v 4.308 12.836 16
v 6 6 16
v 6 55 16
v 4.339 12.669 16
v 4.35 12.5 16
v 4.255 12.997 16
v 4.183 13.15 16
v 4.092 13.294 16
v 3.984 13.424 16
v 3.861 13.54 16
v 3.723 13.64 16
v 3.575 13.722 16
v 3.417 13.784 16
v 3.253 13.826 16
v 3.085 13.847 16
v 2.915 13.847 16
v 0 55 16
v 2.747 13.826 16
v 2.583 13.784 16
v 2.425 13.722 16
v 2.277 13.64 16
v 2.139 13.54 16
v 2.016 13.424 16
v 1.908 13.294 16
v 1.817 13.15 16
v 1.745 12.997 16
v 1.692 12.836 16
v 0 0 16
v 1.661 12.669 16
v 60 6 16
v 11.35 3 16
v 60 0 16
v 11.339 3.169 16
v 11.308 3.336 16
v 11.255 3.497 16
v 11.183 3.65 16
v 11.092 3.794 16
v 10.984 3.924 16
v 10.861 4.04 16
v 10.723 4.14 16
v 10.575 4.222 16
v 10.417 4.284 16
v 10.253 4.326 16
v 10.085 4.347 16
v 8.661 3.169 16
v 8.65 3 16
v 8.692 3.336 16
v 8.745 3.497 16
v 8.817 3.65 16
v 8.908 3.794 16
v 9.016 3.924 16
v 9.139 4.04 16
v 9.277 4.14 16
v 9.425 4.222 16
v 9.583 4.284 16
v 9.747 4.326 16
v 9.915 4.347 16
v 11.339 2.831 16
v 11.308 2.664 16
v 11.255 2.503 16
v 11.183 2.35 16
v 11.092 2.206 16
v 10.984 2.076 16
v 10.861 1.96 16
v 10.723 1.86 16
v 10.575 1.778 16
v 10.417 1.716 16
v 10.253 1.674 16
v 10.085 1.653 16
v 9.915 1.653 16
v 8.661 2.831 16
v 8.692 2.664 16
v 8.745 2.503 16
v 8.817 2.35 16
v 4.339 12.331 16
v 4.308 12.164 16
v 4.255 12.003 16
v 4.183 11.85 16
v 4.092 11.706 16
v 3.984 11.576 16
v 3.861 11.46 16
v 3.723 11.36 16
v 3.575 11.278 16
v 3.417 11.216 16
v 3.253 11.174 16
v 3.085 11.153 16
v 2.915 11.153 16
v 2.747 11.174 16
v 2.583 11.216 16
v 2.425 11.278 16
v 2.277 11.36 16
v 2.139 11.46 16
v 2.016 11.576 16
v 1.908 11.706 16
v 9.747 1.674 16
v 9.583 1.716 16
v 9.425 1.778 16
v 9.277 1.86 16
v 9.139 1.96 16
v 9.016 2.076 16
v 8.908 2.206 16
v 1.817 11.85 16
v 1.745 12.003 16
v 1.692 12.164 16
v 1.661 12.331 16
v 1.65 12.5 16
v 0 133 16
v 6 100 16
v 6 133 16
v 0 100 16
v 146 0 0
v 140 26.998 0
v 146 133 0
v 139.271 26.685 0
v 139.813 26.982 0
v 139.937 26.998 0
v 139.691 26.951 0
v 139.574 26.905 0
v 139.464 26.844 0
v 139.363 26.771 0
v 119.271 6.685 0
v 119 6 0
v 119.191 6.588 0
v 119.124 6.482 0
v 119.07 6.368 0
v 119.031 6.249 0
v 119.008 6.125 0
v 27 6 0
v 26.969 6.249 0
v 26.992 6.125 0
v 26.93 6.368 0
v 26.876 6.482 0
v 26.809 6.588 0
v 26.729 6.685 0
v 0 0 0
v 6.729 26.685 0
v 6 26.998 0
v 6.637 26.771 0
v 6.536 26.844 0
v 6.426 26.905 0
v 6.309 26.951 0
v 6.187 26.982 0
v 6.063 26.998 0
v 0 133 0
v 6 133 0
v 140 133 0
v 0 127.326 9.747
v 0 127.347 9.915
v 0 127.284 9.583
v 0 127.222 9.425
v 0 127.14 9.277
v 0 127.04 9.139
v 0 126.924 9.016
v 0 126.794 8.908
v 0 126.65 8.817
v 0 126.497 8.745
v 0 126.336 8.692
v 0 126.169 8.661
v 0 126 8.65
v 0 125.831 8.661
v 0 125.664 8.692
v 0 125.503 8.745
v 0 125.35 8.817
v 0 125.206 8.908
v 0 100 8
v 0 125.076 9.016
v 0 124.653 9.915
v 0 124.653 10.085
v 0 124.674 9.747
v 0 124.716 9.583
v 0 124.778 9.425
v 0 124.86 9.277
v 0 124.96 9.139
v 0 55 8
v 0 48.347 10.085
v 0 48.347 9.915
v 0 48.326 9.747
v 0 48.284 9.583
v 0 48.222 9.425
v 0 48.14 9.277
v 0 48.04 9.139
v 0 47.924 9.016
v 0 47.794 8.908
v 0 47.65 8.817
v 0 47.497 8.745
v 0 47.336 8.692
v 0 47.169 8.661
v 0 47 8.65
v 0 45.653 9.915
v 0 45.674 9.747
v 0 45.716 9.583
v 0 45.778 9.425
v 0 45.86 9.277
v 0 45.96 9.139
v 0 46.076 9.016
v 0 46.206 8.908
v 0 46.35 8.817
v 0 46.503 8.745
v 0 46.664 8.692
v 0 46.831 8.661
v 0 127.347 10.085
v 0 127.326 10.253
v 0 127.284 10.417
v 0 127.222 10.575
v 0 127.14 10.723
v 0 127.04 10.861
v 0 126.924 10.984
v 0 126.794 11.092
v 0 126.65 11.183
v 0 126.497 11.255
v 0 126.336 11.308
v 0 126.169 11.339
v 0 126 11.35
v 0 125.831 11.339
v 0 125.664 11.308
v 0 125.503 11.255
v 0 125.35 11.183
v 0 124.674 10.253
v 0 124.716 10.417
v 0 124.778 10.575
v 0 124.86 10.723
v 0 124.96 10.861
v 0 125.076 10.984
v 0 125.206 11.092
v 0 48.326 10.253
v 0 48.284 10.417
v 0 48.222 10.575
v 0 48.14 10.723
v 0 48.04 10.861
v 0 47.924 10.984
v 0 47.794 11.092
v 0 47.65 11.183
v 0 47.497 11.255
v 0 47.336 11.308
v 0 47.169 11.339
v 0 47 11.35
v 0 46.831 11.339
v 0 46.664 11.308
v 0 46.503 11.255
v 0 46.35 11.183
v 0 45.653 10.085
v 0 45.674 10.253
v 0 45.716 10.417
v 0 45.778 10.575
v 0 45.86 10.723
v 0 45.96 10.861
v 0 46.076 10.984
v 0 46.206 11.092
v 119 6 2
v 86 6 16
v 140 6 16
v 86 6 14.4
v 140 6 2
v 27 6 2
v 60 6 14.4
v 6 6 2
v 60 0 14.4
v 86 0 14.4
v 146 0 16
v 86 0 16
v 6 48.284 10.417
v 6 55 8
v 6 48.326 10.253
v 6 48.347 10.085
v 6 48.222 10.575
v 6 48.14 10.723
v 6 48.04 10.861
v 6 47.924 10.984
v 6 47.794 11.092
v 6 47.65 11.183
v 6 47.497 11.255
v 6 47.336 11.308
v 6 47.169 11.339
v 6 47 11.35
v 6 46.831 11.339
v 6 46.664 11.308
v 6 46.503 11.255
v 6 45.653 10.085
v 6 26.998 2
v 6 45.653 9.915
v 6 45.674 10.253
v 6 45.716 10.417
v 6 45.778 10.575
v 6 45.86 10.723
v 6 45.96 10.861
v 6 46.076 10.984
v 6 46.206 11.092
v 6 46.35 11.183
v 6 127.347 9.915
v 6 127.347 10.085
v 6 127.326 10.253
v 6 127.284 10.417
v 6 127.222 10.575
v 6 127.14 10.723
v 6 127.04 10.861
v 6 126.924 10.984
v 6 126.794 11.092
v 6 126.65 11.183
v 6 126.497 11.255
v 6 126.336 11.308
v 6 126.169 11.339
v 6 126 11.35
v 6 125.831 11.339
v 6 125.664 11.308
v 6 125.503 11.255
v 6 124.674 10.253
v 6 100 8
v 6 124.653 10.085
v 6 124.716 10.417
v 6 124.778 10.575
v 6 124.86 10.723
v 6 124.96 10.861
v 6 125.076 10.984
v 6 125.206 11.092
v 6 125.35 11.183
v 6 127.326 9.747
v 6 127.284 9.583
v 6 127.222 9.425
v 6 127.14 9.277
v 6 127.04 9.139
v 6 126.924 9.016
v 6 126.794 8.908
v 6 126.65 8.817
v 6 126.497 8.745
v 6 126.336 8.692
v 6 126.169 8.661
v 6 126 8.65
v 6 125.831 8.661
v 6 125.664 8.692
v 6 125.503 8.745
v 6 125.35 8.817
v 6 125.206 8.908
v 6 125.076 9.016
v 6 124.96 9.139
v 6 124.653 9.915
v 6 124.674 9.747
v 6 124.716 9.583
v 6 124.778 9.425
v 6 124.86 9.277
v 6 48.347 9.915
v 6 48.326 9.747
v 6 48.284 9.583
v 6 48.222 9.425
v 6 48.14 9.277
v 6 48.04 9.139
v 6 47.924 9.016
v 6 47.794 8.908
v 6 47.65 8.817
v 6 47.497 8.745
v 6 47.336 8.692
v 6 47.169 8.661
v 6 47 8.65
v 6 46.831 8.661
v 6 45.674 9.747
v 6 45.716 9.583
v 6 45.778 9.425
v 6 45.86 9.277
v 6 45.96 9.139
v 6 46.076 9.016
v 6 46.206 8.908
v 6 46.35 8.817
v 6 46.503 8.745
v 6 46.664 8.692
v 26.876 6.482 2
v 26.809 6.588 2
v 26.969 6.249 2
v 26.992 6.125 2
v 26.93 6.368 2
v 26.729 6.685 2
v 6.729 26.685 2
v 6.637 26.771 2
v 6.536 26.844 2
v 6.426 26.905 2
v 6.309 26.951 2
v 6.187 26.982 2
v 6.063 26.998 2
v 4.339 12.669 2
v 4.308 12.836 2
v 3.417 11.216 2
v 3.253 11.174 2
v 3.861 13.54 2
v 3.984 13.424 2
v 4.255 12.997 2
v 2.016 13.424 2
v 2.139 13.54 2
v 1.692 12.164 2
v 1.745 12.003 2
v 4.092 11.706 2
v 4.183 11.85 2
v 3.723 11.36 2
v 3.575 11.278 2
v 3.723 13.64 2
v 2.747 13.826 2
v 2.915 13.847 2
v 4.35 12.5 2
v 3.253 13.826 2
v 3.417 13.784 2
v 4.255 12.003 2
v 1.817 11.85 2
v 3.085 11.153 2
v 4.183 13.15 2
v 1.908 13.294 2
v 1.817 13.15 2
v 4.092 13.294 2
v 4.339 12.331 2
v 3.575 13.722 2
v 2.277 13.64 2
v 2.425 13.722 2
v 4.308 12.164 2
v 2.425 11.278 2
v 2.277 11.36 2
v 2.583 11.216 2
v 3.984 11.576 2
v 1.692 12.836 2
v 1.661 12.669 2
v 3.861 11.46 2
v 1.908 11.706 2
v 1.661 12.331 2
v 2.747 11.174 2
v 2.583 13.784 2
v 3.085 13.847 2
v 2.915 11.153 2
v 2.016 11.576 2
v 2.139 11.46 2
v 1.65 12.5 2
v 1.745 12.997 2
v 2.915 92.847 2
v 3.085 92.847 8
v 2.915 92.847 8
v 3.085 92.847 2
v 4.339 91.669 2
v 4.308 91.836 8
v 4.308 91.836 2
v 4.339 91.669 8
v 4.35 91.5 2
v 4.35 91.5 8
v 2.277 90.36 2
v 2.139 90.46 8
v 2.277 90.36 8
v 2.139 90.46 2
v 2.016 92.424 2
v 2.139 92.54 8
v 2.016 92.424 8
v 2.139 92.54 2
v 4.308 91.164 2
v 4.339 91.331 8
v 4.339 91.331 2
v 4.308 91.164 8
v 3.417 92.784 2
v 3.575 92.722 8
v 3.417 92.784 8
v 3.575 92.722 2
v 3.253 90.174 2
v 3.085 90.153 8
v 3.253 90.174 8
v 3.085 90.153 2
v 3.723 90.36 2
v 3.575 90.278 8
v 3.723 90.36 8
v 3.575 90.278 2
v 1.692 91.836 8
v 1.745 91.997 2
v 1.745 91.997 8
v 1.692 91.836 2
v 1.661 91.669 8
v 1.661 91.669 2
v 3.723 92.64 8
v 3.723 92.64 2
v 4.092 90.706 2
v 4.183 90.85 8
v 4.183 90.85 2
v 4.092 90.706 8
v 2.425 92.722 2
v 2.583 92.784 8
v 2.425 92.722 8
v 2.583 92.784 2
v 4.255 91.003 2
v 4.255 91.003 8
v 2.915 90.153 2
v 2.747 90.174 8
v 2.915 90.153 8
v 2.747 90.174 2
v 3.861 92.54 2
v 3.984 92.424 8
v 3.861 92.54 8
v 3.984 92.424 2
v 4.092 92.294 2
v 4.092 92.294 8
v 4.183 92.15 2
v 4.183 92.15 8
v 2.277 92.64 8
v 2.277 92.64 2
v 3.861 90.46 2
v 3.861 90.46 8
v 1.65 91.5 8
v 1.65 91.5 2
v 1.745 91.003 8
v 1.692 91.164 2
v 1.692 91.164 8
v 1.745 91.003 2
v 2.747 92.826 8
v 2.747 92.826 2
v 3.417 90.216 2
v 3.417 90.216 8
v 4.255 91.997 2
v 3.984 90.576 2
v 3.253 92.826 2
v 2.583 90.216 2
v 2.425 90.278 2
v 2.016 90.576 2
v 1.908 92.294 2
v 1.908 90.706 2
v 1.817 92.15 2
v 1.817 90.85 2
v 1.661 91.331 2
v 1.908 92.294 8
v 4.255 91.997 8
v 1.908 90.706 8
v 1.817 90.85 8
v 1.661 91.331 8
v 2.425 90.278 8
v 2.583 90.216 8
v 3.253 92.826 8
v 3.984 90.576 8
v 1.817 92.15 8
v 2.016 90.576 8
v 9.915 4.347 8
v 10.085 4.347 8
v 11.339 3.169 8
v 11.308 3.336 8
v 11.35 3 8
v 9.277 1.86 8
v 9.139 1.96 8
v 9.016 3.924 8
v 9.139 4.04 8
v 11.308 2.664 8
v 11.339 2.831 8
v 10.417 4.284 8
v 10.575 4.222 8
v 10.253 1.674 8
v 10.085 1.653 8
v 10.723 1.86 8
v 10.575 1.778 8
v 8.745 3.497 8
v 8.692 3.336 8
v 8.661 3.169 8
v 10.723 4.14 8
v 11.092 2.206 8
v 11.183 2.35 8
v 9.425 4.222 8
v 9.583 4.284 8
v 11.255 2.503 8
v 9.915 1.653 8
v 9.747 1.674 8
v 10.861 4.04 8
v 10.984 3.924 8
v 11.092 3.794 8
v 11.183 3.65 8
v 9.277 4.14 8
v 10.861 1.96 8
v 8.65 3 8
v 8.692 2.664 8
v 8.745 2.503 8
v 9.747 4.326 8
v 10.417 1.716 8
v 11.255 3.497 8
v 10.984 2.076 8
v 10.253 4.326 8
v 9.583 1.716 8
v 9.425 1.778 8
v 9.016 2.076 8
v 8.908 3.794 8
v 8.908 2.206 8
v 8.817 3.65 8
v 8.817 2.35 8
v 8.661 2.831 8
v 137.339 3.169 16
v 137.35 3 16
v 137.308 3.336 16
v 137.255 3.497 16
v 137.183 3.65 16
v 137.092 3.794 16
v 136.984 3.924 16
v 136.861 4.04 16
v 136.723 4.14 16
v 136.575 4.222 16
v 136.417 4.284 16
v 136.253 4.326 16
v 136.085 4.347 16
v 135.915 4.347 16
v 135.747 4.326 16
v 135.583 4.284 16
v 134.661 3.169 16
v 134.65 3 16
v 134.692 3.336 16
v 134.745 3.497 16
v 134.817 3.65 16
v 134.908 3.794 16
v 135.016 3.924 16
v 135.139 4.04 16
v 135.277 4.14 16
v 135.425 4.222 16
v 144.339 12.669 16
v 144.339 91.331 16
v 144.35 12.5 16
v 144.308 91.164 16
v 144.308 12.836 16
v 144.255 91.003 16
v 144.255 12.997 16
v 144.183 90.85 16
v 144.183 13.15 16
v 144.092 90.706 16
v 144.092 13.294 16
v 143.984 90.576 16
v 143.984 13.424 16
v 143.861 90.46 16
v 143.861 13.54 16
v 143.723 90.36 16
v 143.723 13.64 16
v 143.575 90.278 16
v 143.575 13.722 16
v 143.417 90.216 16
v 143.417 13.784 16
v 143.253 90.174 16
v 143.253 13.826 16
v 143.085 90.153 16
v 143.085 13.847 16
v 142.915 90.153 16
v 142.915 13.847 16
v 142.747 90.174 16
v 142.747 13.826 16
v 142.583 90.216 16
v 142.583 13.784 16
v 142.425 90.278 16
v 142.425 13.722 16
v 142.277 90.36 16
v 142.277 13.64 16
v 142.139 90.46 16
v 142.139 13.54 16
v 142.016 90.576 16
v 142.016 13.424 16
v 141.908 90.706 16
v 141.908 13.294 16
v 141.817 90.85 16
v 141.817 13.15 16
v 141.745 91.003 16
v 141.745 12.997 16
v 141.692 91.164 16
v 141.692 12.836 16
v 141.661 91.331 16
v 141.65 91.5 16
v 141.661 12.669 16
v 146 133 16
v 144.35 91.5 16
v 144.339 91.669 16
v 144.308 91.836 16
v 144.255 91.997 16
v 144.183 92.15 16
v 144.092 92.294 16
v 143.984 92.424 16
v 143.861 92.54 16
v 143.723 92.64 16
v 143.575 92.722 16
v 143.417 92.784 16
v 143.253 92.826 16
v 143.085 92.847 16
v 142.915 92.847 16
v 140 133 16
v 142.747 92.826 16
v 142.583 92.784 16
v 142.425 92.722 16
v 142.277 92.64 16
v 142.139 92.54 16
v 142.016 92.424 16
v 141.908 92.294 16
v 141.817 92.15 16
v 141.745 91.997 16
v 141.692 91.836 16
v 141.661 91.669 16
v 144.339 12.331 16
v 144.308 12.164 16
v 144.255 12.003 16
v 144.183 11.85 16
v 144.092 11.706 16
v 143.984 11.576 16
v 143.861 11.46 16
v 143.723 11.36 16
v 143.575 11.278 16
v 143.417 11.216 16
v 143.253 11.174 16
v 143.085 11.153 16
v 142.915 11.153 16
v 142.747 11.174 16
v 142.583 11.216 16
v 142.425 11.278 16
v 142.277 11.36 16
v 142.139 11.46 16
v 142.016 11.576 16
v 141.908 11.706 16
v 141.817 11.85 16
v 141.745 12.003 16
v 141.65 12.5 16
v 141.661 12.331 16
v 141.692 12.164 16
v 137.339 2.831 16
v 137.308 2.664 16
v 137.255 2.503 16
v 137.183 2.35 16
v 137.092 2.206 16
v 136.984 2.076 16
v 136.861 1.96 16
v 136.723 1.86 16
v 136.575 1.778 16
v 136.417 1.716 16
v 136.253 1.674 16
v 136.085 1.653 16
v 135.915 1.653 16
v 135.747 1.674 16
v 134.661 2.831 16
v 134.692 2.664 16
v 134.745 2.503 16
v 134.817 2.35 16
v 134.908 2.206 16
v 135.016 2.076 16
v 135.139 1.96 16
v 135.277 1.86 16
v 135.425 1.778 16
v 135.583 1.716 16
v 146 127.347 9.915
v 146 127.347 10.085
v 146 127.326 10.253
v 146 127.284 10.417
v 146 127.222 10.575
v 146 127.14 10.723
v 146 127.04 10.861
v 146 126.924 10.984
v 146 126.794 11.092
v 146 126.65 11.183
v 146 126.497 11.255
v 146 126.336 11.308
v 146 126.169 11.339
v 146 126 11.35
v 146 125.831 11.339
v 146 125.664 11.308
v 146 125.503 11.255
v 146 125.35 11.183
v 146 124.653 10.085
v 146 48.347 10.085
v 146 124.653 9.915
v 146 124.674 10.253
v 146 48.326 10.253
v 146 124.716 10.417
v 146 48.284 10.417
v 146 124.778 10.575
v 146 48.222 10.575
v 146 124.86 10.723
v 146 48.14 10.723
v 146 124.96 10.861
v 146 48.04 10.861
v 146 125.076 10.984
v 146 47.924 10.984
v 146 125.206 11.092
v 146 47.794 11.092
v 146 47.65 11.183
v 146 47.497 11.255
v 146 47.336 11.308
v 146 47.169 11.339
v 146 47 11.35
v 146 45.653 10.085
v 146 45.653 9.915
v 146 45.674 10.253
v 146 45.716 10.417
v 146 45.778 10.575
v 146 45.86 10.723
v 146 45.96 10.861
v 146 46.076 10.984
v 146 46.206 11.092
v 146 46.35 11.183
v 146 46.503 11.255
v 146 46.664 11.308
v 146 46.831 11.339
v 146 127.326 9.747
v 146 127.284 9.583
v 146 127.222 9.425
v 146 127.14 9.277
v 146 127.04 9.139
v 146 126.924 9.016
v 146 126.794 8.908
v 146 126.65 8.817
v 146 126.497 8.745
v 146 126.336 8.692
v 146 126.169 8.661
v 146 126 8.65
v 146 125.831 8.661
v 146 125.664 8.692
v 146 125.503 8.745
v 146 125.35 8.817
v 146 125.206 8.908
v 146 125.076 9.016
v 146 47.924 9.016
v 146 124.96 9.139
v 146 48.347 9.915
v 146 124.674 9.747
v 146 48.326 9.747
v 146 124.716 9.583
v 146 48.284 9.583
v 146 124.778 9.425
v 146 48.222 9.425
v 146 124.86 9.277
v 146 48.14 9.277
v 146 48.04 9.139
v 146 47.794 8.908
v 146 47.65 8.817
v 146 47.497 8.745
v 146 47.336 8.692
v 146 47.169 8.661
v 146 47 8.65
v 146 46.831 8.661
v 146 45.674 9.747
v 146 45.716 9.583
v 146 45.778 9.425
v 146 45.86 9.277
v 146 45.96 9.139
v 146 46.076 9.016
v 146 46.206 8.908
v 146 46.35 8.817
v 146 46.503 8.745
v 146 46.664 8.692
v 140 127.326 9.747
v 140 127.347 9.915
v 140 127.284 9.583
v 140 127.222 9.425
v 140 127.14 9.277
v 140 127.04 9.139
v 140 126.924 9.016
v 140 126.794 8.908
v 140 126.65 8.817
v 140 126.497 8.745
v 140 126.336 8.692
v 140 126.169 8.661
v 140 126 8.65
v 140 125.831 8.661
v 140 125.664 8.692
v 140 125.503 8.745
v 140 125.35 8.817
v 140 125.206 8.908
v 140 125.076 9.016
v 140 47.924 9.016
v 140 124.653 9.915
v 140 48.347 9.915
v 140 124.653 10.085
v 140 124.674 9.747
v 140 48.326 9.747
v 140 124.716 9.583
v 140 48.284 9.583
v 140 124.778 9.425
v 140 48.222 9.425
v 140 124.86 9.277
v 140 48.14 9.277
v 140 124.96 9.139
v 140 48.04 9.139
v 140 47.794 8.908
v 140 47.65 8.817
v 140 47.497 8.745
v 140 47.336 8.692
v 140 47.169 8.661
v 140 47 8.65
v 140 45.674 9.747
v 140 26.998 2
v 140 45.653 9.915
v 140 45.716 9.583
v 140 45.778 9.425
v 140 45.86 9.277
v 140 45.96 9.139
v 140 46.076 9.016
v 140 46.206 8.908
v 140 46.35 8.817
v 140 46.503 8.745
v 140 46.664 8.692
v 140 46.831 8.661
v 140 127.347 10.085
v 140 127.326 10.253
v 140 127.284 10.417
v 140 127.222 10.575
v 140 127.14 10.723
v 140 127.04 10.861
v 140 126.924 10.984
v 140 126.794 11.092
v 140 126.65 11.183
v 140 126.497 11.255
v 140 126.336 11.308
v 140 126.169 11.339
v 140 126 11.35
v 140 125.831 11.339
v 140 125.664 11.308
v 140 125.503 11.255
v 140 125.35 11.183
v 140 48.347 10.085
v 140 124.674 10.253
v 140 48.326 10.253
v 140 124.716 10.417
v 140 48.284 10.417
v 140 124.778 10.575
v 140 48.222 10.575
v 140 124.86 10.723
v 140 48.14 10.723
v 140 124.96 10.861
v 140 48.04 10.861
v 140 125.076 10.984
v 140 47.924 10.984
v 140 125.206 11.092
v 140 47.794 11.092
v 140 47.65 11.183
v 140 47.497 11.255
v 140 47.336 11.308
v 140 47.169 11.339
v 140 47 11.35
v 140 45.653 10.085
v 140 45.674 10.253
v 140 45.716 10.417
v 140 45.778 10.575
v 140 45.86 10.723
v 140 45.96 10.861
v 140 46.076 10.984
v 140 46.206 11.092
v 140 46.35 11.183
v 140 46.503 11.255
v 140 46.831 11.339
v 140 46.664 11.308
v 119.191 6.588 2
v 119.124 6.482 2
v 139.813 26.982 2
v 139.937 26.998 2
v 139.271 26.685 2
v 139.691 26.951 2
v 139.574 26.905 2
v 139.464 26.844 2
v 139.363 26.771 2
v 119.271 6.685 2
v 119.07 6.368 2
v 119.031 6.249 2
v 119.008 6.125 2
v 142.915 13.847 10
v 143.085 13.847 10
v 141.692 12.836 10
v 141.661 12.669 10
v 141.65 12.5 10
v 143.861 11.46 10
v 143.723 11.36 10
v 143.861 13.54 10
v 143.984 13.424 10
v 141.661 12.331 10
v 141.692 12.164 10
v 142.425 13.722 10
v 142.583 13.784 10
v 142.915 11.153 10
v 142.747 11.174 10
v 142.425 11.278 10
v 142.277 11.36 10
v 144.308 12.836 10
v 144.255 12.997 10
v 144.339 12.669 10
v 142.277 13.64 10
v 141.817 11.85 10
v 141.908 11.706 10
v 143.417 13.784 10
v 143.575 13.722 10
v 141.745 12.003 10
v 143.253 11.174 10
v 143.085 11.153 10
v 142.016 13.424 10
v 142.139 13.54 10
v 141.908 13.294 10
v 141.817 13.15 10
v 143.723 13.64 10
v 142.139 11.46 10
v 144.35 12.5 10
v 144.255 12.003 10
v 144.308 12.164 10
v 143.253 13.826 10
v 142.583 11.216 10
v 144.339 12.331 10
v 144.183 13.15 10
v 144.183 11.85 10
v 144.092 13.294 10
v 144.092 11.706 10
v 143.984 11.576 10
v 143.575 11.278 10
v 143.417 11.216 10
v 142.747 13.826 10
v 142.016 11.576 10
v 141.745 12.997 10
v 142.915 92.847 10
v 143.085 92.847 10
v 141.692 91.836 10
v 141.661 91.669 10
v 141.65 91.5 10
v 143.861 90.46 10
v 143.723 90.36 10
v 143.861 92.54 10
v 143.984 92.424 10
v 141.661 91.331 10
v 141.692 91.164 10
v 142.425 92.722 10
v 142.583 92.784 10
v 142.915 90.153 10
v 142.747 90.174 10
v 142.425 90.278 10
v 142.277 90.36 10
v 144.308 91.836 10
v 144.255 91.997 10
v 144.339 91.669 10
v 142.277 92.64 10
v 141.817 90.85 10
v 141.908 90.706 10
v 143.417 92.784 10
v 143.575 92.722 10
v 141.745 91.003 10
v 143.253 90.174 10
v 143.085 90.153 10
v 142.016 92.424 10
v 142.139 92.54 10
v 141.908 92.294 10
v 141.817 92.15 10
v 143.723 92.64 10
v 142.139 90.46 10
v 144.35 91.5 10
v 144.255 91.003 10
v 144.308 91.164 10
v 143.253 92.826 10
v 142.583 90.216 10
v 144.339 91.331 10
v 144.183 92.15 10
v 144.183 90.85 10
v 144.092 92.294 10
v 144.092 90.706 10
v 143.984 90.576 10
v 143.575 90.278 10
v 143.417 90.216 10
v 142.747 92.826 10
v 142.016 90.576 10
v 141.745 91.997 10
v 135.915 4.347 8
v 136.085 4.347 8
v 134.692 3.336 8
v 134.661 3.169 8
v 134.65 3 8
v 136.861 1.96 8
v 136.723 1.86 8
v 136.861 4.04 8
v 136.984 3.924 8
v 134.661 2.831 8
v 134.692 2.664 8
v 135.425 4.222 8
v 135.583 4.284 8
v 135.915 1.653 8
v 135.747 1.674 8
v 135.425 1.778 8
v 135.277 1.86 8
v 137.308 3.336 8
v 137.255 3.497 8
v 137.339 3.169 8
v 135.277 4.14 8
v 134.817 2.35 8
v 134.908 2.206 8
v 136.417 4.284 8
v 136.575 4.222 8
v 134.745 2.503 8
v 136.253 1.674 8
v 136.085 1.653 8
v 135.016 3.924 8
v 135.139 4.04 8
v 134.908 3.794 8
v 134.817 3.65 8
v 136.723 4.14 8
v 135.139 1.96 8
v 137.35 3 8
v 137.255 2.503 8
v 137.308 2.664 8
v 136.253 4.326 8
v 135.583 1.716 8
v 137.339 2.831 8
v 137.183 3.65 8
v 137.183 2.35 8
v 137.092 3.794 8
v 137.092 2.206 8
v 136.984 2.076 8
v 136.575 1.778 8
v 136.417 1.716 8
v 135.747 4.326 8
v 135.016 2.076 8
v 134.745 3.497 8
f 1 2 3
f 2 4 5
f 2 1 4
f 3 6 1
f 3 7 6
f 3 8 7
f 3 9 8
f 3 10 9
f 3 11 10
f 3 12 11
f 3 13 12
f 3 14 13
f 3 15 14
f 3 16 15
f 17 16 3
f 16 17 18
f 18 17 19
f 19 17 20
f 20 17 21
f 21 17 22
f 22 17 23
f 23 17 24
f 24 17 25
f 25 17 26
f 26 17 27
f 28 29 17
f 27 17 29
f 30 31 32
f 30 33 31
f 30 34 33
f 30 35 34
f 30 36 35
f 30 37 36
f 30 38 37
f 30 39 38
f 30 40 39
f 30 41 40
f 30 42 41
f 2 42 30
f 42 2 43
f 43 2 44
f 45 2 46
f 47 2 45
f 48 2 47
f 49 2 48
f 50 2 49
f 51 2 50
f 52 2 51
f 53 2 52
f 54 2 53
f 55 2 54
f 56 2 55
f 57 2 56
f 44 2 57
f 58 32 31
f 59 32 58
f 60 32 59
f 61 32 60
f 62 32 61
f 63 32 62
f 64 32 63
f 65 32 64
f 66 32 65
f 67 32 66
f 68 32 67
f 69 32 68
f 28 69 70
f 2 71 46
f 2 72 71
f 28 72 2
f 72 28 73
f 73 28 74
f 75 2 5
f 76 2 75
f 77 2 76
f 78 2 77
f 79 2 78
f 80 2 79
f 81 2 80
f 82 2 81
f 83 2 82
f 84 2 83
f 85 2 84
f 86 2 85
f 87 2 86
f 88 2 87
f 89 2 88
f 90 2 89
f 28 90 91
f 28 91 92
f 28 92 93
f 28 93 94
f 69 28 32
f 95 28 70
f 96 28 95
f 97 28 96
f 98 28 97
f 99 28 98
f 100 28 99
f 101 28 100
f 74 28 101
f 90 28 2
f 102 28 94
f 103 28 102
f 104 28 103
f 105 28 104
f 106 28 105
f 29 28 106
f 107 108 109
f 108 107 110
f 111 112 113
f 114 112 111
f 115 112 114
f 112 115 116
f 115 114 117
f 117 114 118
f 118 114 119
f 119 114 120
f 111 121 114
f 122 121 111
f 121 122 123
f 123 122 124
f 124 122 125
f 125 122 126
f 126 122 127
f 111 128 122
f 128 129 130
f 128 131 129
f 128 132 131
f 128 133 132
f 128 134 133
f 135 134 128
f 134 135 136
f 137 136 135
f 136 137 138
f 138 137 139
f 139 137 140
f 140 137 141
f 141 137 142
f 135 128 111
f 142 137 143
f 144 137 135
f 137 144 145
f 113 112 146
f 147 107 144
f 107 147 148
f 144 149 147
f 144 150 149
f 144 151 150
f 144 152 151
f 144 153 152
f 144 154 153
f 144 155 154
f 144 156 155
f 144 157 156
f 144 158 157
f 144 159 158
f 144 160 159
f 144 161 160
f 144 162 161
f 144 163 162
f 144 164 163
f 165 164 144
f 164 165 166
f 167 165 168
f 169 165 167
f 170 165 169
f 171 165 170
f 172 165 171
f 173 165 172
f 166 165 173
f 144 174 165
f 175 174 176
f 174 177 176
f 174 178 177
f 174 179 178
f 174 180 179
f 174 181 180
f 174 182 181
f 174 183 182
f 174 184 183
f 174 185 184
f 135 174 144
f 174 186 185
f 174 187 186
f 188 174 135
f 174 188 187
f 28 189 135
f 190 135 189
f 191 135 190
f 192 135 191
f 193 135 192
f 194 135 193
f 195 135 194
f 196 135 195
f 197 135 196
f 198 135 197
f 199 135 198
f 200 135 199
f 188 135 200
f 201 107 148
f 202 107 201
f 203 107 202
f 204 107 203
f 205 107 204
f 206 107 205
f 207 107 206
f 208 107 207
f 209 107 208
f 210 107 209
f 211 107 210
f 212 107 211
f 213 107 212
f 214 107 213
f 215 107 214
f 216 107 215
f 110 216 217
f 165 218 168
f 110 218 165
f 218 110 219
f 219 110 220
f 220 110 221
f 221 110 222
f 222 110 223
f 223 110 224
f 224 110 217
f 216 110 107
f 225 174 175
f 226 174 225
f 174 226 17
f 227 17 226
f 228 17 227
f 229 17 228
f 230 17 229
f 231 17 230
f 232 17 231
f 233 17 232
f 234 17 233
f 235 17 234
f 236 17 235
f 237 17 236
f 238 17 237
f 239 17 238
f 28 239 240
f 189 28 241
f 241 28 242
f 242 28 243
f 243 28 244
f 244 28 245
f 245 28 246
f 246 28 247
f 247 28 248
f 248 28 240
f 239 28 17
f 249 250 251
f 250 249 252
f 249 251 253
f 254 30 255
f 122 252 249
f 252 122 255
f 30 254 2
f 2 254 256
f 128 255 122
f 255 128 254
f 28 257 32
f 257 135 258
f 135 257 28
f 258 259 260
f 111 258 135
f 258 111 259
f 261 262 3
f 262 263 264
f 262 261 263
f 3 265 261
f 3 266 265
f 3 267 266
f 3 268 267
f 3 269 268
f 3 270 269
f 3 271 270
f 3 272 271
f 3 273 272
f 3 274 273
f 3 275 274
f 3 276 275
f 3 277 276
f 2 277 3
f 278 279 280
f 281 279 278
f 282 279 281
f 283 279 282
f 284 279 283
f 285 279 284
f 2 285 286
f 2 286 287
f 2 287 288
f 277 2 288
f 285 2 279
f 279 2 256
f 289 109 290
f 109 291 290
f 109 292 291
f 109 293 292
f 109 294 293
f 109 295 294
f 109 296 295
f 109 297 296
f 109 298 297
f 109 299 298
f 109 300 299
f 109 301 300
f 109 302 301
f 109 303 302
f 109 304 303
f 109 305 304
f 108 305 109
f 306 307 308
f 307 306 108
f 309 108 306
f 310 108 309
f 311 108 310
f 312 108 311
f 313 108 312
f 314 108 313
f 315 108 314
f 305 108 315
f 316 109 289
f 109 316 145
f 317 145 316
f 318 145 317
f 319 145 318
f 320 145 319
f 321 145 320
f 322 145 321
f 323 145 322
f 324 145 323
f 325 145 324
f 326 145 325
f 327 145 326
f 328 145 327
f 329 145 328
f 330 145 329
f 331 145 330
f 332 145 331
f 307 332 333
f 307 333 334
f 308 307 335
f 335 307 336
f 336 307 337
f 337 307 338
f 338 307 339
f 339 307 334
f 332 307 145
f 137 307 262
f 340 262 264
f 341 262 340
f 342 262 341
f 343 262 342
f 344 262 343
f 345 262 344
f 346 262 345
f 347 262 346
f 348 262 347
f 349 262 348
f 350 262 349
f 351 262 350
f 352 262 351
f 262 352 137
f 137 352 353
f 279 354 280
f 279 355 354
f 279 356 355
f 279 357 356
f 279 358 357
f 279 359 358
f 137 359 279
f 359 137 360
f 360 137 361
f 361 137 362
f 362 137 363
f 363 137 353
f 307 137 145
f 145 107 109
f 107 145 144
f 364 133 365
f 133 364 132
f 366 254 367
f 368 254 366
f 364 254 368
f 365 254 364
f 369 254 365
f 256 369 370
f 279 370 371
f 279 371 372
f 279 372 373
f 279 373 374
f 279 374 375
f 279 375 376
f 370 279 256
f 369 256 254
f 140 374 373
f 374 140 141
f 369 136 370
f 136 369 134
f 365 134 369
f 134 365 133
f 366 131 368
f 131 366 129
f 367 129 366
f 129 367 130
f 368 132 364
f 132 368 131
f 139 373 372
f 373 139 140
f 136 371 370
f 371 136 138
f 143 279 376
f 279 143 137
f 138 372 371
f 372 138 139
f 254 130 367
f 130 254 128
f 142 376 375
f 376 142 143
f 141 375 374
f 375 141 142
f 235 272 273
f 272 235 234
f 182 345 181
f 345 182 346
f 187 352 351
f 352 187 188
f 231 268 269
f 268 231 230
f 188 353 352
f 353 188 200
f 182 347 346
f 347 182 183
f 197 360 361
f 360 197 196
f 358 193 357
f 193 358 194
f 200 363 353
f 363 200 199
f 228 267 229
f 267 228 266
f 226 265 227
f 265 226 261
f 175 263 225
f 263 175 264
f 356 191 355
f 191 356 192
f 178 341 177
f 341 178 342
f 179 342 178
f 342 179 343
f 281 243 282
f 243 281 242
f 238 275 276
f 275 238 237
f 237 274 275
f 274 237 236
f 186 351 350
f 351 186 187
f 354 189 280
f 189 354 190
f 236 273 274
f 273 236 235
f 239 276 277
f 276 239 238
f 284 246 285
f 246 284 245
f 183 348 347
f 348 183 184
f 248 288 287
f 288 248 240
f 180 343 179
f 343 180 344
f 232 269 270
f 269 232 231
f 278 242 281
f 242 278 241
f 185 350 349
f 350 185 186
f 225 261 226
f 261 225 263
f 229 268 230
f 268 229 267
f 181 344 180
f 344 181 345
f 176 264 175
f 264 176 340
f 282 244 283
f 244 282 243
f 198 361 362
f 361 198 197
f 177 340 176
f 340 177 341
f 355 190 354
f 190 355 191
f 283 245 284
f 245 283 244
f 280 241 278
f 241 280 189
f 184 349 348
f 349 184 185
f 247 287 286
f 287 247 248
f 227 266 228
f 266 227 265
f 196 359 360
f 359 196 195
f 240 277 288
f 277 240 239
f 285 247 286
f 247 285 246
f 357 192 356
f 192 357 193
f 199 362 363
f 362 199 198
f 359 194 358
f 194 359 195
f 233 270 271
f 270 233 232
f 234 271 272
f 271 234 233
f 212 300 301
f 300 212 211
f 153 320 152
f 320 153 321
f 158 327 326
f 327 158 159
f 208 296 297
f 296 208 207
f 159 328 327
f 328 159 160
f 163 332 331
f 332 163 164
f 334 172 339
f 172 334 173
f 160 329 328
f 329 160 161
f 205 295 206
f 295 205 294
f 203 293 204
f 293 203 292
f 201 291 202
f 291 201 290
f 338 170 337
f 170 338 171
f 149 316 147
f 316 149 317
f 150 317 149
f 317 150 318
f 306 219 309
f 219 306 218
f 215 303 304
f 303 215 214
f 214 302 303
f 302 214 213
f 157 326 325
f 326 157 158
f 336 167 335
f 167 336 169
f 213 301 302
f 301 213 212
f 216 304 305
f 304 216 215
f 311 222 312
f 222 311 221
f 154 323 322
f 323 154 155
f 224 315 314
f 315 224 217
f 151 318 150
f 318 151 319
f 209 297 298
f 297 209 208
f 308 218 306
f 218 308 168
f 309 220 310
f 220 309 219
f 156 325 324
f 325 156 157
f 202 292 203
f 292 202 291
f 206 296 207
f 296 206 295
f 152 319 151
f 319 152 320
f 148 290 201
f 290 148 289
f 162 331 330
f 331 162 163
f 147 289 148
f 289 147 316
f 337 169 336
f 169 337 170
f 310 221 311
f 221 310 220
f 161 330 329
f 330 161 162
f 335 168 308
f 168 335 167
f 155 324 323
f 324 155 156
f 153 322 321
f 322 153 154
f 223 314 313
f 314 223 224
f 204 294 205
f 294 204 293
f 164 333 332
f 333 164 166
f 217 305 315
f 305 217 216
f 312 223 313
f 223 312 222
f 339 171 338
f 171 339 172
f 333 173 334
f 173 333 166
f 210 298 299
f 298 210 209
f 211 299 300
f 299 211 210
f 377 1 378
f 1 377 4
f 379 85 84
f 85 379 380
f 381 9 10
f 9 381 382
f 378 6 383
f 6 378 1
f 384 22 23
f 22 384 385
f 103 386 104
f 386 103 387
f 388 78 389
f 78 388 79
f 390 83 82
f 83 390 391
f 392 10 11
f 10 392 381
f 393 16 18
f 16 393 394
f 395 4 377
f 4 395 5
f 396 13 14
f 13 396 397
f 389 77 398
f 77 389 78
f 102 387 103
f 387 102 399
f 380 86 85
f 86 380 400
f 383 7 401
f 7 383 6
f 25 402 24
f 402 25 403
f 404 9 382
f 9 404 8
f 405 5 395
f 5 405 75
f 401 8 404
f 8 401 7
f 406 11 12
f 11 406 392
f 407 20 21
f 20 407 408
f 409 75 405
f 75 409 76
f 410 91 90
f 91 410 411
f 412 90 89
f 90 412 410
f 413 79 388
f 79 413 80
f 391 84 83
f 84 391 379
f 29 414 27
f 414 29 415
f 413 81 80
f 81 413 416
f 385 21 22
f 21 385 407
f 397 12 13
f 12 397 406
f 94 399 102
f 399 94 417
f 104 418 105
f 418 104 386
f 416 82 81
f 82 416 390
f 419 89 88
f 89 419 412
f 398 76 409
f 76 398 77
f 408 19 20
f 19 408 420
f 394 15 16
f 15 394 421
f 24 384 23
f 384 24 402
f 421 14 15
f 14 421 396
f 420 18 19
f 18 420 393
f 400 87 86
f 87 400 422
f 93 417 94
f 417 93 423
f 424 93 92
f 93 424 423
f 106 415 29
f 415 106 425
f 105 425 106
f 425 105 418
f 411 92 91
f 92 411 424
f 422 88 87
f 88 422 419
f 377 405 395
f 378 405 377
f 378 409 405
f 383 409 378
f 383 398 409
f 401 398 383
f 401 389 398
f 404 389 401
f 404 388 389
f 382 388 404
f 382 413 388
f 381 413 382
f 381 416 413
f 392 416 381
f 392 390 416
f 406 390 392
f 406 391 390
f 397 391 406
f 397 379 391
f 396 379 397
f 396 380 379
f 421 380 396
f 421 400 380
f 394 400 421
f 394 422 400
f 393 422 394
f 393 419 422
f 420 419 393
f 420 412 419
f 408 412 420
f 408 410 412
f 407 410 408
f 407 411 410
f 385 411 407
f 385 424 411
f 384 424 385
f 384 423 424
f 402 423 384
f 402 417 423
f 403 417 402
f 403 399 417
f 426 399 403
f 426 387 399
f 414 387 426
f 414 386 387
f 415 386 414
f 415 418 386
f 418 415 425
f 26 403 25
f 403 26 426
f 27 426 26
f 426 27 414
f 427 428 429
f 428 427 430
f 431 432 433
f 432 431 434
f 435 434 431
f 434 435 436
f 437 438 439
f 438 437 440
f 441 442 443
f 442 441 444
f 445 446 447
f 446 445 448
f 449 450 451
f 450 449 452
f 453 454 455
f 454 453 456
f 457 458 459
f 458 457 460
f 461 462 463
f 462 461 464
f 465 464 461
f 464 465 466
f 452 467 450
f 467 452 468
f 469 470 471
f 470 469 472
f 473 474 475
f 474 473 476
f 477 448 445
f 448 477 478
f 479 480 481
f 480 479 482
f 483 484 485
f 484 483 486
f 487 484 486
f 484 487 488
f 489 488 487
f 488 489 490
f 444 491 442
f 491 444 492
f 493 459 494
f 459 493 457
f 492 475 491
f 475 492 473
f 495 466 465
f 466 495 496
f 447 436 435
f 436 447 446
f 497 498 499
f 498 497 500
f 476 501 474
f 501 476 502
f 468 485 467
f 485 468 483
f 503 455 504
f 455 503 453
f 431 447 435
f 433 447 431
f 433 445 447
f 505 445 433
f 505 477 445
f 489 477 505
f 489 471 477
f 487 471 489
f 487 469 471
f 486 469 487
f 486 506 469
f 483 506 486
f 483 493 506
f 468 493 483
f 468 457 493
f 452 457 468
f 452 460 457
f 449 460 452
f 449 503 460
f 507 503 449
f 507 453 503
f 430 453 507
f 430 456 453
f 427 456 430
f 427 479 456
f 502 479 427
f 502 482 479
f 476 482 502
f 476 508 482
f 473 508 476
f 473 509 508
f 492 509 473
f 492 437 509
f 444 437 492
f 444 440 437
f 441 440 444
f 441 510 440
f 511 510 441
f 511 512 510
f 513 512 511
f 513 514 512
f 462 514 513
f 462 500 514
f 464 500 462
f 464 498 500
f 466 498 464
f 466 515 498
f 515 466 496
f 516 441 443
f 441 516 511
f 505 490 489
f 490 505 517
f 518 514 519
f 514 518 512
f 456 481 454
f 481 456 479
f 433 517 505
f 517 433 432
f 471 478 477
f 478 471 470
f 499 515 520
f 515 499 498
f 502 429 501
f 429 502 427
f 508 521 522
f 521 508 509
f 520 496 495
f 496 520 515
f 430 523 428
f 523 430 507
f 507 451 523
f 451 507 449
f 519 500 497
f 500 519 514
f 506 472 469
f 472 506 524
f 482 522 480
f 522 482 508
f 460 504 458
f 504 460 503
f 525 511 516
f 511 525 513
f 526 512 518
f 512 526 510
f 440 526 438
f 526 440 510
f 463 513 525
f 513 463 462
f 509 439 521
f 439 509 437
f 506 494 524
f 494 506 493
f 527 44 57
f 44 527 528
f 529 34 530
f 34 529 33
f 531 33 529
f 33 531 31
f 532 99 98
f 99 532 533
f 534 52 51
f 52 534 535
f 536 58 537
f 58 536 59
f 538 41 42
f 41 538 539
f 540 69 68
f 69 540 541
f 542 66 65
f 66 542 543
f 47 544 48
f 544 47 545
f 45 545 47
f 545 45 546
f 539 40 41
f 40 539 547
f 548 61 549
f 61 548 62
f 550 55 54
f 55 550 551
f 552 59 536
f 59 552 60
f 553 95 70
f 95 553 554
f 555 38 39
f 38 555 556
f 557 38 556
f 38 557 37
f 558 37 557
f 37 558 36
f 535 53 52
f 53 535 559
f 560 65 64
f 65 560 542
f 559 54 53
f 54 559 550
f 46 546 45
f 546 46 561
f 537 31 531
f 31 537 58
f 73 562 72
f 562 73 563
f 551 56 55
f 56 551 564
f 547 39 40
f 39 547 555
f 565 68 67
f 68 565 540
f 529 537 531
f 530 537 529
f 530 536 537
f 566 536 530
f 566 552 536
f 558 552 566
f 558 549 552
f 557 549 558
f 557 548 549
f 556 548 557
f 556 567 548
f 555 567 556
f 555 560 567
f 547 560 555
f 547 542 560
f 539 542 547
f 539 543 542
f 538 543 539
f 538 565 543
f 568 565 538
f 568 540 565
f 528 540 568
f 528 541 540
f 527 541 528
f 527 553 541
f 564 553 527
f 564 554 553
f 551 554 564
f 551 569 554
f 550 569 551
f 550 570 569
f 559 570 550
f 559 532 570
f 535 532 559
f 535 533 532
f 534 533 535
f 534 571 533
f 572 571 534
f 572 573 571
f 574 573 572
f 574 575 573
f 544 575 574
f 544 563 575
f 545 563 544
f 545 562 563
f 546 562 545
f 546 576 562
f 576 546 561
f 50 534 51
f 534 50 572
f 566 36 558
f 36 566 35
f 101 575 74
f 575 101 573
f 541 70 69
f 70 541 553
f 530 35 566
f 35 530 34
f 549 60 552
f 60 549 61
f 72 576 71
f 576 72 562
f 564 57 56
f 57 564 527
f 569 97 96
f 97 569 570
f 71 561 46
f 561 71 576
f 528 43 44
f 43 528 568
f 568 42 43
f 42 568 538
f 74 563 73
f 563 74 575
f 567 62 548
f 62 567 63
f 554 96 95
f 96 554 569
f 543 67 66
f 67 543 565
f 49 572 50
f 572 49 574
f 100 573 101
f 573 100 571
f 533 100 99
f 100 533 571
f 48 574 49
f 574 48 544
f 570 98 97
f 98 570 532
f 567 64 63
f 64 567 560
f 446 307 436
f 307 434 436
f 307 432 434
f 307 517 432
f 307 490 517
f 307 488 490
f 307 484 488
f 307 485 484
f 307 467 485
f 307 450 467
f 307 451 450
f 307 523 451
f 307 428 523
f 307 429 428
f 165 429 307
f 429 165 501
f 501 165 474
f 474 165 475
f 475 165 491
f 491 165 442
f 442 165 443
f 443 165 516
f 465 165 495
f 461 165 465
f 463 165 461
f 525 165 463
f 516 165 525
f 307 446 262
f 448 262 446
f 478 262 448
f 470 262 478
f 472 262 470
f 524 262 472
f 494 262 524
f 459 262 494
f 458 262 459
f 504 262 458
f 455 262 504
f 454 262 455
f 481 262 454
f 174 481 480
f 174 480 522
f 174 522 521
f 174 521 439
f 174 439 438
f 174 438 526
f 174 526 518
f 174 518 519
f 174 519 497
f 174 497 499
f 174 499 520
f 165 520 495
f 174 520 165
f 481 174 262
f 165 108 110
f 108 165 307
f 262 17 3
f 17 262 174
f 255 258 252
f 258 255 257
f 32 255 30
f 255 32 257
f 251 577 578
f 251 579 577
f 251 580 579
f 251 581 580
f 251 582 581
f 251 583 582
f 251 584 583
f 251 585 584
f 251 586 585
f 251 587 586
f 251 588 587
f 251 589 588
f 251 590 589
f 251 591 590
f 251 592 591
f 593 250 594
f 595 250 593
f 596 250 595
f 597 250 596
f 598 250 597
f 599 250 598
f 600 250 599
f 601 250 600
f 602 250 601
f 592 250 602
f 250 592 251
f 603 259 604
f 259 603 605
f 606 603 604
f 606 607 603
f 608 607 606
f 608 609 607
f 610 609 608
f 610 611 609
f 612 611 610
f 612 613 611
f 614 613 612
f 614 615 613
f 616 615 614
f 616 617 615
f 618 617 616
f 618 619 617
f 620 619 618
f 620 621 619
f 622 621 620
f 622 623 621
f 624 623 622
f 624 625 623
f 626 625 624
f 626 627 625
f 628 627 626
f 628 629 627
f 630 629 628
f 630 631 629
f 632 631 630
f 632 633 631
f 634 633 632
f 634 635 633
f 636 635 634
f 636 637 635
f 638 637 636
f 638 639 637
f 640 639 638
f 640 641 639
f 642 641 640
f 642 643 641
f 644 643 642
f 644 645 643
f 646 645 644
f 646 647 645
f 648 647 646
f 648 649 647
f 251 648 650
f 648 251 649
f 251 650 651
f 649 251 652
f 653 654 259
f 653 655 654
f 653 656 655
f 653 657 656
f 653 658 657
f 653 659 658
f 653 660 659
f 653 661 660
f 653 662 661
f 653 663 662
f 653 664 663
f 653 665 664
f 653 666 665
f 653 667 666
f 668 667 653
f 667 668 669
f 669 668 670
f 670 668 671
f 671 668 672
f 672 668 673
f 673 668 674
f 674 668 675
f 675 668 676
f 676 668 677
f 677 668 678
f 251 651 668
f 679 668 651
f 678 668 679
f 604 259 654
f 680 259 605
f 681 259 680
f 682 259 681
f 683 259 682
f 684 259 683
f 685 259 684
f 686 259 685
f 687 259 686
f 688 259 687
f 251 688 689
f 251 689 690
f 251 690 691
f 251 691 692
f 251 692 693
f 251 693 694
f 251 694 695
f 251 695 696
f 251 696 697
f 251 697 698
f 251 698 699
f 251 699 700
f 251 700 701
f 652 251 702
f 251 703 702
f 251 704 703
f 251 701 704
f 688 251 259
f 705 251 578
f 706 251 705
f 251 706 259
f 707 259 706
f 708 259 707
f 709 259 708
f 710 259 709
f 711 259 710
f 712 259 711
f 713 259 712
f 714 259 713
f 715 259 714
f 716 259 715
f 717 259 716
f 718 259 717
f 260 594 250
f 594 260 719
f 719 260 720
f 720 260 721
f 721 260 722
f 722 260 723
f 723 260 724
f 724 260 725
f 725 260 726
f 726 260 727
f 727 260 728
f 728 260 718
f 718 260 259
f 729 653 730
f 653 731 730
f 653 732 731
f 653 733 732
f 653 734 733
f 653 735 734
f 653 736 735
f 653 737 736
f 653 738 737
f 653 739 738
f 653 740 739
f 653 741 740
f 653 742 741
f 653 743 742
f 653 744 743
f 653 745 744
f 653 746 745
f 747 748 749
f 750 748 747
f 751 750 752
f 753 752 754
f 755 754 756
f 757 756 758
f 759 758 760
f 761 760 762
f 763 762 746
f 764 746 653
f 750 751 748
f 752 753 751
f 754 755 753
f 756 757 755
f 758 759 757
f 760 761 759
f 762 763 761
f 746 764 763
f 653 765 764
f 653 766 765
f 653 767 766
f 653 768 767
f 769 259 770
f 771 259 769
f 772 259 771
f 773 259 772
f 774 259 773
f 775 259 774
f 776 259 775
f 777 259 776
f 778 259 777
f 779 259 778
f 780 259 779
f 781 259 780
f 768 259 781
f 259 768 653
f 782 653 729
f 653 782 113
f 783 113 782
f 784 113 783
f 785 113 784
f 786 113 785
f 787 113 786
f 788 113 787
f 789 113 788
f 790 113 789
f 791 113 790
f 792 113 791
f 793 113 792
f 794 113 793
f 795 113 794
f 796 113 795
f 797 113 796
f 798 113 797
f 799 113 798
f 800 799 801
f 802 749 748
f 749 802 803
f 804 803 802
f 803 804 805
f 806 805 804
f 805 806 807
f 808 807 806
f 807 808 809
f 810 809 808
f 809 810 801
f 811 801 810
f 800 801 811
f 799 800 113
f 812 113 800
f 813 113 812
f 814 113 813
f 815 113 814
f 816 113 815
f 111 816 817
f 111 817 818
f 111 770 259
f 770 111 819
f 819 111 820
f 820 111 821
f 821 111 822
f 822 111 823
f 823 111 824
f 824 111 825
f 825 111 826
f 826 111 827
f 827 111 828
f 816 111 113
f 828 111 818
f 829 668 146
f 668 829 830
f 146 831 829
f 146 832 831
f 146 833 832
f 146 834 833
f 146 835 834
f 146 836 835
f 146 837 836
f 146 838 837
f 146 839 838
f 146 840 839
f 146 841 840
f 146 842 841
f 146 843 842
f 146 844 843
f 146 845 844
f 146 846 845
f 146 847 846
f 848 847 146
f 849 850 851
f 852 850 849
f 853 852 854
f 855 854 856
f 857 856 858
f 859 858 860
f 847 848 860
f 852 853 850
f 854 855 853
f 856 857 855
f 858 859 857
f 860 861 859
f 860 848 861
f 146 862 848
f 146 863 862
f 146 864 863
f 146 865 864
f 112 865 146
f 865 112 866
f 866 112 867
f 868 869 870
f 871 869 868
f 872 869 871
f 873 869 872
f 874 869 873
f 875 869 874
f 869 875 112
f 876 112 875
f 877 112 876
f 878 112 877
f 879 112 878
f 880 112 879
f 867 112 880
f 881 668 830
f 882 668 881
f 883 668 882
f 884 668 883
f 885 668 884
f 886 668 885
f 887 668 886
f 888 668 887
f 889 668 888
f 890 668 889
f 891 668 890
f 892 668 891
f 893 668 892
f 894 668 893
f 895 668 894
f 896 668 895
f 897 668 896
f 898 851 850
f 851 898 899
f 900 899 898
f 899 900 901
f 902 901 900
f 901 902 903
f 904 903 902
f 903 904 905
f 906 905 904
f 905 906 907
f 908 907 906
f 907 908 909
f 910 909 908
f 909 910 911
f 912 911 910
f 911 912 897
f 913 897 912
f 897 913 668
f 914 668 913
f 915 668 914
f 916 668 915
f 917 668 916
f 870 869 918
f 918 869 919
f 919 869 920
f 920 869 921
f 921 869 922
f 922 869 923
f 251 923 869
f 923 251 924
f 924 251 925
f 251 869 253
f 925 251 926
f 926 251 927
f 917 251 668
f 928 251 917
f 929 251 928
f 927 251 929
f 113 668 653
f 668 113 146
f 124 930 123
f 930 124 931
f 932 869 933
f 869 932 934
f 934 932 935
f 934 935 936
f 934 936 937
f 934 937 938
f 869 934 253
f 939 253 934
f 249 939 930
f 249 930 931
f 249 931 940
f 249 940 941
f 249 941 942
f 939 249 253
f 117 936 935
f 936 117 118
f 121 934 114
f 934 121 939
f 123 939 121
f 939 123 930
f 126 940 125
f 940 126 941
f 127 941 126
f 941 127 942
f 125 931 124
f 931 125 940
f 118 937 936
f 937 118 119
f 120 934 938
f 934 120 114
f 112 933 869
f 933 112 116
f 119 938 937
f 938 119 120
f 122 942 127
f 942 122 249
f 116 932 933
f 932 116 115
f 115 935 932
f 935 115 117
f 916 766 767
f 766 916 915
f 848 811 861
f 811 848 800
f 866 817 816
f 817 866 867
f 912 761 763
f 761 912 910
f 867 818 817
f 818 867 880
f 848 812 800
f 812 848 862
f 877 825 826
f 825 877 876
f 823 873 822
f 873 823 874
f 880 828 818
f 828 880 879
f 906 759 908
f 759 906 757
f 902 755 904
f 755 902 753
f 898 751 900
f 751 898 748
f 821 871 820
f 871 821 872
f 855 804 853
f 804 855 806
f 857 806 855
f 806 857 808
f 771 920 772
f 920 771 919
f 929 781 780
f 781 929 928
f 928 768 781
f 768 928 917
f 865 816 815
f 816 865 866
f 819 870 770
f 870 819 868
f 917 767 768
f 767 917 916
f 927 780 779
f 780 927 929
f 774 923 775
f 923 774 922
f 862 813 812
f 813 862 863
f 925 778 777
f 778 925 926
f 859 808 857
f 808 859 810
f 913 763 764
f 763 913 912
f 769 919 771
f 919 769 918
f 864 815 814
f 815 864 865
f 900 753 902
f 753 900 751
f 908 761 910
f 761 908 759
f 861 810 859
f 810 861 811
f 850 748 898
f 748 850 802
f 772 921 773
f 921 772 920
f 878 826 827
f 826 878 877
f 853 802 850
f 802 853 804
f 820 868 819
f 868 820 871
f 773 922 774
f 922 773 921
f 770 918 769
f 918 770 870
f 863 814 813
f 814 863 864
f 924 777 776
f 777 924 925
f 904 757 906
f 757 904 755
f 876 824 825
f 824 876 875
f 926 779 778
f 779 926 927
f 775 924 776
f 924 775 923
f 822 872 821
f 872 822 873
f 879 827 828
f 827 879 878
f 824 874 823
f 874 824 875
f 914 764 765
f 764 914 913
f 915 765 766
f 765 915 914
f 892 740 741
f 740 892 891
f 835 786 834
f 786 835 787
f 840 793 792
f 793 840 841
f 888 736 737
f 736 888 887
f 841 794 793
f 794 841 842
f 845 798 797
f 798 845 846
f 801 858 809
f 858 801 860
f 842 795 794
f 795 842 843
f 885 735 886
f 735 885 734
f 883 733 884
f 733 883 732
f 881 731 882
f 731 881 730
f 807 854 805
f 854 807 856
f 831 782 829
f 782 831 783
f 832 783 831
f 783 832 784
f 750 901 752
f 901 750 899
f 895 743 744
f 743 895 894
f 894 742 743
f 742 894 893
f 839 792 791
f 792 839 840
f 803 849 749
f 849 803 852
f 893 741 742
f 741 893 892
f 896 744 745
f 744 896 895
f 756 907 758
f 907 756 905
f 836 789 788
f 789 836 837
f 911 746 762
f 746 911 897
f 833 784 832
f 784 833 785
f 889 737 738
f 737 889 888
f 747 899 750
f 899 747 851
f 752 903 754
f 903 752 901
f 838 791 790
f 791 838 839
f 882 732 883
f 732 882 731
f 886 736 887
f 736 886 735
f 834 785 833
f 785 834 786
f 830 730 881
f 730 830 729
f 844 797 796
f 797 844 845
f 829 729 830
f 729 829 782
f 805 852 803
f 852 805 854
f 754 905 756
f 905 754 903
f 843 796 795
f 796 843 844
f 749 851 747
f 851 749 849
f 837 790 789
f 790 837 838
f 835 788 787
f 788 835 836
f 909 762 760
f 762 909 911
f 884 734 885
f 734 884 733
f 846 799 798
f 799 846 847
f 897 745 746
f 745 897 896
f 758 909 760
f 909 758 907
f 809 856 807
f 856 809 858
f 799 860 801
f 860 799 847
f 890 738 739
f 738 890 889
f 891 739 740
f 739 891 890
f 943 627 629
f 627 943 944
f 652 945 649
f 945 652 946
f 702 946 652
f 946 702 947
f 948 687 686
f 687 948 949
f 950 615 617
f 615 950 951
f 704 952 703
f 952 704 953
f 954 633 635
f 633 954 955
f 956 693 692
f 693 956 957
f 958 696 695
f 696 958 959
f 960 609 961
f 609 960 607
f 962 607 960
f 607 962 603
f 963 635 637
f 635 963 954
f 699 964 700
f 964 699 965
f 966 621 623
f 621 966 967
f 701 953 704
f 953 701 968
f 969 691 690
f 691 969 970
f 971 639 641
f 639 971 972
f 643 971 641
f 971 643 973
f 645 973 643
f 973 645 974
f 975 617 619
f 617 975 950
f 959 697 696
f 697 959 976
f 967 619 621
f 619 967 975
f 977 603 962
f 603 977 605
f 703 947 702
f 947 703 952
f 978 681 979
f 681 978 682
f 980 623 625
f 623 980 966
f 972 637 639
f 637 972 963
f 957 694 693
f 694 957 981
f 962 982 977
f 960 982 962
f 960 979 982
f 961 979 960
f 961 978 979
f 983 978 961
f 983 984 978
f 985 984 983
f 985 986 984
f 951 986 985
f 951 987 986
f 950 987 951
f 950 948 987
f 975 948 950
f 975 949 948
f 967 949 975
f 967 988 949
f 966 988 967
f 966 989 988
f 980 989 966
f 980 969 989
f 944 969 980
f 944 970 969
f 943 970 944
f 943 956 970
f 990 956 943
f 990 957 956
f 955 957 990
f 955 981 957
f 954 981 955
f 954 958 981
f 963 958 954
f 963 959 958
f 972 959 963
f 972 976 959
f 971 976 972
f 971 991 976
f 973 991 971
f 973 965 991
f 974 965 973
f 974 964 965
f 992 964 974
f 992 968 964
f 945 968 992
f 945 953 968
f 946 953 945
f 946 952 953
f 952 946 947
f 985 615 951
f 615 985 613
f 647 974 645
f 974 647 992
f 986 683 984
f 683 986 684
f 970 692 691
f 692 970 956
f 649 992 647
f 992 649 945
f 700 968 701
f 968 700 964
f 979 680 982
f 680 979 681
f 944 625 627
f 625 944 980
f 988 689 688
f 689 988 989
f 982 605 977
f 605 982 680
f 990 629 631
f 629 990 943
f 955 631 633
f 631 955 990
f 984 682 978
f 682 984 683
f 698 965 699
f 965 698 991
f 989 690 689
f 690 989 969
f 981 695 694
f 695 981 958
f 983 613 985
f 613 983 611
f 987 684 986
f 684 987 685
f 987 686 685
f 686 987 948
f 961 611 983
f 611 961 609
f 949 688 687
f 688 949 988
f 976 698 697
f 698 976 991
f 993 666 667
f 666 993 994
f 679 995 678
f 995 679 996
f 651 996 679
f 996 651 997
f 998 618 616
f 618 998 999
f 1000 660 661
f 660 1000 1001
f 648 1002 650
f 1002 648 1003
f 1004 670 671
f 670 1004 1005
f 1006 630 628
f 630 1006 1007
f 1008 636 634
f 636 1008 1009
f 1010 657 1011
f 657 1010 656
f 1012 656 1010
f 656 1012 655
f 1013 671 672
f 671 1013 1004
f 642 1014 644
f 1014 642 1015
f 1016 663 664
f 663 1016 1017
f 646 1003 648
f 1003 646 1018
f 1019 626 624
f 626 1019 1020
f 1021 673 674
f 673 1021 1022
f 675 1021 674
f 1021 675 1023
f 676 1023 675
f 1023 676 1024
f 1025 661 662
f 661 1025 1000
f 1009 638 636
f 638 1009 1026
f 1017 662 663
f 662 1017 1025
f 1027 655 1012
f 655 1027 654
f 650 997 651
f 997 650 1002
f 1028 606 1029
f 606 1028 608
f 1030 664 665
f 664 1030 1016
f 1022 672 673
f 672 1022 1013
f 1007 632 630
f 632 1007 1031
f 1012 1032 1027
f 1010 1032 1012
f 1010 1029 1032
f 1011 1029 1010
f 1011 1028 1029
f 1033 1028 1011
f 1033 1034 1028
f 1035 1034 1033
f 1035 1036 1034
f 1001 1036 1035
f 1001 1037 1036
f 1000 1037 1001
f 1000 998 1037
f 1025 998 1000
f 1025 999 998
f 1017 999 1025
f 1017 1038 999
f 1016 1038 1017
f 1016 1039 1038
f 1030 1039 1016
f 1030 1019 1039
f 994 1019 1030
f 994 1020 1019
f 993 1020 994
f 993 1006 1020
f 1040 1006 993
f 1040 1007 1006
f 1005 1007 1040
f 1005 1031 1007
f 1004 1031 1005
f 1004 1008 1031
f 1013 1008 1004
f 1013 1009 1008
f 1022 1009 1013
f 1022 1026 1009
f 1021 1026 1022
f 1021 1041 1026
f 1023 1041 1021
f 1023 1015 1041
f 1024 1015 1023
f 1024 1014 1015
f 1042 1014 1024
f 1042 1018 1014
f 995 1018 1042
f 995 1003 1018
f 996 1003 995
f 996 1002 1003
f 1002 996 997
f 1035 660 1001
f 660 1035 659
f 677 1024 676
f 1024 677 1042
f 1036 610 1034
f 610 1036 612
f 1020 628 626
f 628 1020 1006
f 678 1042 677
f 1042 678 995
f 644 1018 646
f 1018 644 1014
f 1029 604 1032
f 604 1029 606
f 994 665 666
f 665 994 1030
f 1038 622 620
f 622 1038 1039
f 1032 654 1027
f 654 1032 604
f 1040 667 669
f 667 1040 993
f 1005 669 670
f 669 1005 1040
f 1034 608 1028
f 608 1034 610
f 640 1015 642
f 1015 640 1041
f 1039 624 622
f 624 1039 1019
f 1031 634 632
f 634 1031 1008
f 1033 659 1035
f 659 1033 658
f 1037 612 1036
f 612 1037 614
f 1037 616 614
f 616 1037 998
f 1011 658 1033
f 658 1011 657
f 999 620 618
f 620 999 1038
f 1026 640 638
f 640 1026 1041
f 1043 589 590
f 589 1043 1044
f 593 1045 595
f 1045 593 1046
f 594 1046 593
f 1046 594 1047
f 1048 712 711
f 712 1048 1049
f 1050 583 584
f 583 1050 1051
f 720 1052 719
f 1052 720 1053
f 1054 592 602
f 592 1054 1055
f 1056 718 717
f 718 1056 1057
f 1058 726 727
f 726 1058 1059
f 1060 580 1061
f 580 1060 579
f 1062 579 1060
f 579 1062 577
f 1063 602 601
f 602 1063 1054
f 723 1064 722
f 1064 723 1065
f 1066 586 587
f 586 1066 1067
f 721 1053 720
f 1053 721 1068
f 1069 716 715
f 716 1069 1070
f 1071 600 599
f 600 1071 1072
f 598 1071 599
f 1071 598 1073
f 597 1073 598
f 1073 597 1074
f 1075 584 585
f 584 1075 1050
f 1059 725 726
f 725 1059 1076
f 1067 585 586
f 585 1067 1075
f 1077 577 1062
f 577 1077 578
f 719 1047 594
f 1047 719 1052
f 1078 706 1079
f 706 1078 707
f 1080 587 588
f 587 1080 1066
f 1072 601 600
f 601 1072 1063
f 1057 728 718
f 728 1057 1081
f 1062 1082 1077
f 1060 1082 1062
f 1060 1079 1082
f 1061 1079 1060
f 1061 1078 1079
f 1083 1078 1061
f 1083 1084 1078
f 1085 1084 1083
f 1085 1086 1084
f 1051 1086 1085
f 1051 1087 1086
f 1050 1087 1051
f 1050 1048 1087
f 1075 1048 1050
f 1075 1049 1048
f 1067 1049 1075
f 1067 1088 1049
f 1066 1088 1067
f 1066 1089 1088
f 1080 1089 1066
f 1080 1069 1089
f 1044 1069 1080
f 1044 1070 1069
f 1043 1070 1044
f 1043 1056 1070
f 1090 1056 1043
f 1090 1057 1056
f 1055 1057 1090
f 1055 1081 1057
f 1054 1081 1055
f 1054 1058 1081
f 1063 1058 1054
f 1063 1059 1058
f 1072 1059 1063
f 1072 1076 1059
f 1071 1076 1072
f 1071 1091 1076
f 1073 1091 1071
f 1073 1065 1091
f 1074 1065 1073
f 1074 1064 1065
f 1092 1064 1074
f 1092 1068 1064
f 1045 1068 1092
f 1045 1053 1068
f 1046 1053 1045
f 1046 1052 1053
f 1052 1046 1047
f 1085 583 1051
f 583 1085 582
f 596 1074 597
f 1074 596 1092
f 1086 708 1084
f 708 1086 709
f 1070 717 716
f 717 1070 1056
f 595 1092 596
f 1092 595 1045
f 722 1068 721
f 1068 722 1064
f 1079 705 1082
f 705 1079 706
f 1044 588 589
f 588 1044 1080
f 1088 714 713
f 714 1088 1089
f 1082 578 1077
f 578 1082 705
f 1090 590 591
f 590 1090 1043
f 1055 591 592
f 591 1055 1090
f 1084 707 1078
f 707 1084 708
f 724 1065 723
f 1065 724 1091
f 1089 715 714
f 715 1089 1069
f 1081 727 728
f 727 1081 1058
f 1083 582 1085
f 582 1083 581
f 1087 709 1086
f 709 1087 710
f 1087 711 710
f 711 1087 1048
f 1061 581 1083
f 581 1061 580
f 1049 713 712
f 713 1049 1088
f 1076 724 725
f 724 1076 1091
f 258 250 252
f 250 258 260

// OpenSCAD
// Alternative 5.25" half height mount for DECromancer's MFM Emulator
// By Hans Christian Saustrup <hc@saustrup.net>
model_version = "v0.1.0";

// $fn = $preview ? 0 : 25;
$fn = $preview ? 0 : 50;

// Model is mirred - this is the true width:
bar_true_x = 146;

rail = [6, 133, 16];
bar = [bar_true_x/2, 6, 16];
holes_y = [47, 126];

// Screws and spacers
screw_r = 3/2;
thread_r = 2.7/2;
front_screw_h = 8; // 3M10 - mount thickness

// pcb_hole_x = (bar_true_x - 139) / 2;
pcb_holes_y = [12.5, 12.5+79];
pcb_screw_h = 6;
pcb_spacer_h = 8;

front_mount_x = 126;
front_mount_z = 3;

for (r=[0,1])
translate([r * (bar_true_x),0,0])
mirror([r,0,0])
difference() {
    union() {
        cube(bar);
        cube(rail);

        o = 20;
        h = 2;

        // Rectangular stabilizer
        color([0.5, 0.5, 0.5])
        hull() {
            translate([rail.x,   bar.y])   cylinder(r=1, h=h);
            translate([rail.x,   bar.y+o]) cylinder(r=1, h=h);
            translate([rail.x+o, bar.y])   cylinder(r=1, h=h);
        }
    }
    union() {
        // Side holes
        for (y=holes_y) {
            translate([0, y, 10])
            rotate([0,90,0])
            cylinder(r=thread_r, h=rail.x);
        }

        // Front panel screws (account for thickness of front plate mount)
        translate([bar.x-(front_mount_x/2), front_mount_z, 0])
        translate([0,0,bar.z-front_screw_h])
        cylinder(r=thread_r, h=front_screw_h);

        cutout_side = r==0;

        // PCB holes
        for (y=pcb_holes_y) {
            this_pcb_screw_h = pcb_screw_h + (!cutout_side || y < 10 ? 0 : pcb_spacer_h); 

            translate([rail.x/2, y, 0])
            translate([0, 0, bar.z - this_pcb_screw_h])
            cylinder(r=thread_r, h=this_pcb_screw_h);
        }

        // Hot area cutout
        if (cutout_side) {
            cutout = [rail.x, 45, pcb_spacer_h];
            translate([0, 55, rail.z-cutout.z])
            cube(cutout);
        }

        // Ethernet cutout
        cutout = [13, bar.y, 1.6];
        translate([60, 0, bar.z-cutout.z])
        cube(cutout);
    }
}
